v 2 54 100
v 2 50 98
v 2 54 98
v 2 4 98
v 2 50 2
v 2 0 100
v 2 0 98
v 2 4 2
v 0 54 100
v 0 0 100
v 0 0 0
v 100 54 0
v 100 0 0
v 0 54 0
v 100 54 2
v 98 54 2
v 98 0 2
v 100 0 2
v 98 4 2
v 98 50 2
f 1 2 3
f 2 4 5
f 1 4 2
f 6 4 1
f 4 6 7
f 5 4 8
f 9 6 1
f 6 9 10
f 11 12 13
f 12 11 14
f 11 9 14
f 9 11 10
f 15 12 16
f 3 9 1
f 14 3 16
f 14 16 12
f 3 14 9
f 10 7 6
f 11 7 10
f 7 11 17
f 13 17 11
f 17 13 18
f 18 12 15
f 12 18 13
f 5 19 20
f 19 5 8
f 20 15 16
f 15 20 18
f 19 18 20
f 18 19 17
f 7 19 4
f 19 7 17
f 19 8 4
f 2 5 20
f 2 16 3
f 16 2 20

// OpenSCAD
d=100;
t=2;
h=d;

kb=25+t; //Klebeband
w=kb*2;
wd=t*2;

module seite()
{
cube([t,w,h]);
}

seite();

module oben()
{
cube([h,w,t]);
}

oben();

module winkel()
{
rotate([270,270,0])
color("yellow")
linear_extrude(wd)
polygon([[0,0],[h,0],[0,h]]);
}

winkel();

translate([0,w-wd,0])
winkel();
